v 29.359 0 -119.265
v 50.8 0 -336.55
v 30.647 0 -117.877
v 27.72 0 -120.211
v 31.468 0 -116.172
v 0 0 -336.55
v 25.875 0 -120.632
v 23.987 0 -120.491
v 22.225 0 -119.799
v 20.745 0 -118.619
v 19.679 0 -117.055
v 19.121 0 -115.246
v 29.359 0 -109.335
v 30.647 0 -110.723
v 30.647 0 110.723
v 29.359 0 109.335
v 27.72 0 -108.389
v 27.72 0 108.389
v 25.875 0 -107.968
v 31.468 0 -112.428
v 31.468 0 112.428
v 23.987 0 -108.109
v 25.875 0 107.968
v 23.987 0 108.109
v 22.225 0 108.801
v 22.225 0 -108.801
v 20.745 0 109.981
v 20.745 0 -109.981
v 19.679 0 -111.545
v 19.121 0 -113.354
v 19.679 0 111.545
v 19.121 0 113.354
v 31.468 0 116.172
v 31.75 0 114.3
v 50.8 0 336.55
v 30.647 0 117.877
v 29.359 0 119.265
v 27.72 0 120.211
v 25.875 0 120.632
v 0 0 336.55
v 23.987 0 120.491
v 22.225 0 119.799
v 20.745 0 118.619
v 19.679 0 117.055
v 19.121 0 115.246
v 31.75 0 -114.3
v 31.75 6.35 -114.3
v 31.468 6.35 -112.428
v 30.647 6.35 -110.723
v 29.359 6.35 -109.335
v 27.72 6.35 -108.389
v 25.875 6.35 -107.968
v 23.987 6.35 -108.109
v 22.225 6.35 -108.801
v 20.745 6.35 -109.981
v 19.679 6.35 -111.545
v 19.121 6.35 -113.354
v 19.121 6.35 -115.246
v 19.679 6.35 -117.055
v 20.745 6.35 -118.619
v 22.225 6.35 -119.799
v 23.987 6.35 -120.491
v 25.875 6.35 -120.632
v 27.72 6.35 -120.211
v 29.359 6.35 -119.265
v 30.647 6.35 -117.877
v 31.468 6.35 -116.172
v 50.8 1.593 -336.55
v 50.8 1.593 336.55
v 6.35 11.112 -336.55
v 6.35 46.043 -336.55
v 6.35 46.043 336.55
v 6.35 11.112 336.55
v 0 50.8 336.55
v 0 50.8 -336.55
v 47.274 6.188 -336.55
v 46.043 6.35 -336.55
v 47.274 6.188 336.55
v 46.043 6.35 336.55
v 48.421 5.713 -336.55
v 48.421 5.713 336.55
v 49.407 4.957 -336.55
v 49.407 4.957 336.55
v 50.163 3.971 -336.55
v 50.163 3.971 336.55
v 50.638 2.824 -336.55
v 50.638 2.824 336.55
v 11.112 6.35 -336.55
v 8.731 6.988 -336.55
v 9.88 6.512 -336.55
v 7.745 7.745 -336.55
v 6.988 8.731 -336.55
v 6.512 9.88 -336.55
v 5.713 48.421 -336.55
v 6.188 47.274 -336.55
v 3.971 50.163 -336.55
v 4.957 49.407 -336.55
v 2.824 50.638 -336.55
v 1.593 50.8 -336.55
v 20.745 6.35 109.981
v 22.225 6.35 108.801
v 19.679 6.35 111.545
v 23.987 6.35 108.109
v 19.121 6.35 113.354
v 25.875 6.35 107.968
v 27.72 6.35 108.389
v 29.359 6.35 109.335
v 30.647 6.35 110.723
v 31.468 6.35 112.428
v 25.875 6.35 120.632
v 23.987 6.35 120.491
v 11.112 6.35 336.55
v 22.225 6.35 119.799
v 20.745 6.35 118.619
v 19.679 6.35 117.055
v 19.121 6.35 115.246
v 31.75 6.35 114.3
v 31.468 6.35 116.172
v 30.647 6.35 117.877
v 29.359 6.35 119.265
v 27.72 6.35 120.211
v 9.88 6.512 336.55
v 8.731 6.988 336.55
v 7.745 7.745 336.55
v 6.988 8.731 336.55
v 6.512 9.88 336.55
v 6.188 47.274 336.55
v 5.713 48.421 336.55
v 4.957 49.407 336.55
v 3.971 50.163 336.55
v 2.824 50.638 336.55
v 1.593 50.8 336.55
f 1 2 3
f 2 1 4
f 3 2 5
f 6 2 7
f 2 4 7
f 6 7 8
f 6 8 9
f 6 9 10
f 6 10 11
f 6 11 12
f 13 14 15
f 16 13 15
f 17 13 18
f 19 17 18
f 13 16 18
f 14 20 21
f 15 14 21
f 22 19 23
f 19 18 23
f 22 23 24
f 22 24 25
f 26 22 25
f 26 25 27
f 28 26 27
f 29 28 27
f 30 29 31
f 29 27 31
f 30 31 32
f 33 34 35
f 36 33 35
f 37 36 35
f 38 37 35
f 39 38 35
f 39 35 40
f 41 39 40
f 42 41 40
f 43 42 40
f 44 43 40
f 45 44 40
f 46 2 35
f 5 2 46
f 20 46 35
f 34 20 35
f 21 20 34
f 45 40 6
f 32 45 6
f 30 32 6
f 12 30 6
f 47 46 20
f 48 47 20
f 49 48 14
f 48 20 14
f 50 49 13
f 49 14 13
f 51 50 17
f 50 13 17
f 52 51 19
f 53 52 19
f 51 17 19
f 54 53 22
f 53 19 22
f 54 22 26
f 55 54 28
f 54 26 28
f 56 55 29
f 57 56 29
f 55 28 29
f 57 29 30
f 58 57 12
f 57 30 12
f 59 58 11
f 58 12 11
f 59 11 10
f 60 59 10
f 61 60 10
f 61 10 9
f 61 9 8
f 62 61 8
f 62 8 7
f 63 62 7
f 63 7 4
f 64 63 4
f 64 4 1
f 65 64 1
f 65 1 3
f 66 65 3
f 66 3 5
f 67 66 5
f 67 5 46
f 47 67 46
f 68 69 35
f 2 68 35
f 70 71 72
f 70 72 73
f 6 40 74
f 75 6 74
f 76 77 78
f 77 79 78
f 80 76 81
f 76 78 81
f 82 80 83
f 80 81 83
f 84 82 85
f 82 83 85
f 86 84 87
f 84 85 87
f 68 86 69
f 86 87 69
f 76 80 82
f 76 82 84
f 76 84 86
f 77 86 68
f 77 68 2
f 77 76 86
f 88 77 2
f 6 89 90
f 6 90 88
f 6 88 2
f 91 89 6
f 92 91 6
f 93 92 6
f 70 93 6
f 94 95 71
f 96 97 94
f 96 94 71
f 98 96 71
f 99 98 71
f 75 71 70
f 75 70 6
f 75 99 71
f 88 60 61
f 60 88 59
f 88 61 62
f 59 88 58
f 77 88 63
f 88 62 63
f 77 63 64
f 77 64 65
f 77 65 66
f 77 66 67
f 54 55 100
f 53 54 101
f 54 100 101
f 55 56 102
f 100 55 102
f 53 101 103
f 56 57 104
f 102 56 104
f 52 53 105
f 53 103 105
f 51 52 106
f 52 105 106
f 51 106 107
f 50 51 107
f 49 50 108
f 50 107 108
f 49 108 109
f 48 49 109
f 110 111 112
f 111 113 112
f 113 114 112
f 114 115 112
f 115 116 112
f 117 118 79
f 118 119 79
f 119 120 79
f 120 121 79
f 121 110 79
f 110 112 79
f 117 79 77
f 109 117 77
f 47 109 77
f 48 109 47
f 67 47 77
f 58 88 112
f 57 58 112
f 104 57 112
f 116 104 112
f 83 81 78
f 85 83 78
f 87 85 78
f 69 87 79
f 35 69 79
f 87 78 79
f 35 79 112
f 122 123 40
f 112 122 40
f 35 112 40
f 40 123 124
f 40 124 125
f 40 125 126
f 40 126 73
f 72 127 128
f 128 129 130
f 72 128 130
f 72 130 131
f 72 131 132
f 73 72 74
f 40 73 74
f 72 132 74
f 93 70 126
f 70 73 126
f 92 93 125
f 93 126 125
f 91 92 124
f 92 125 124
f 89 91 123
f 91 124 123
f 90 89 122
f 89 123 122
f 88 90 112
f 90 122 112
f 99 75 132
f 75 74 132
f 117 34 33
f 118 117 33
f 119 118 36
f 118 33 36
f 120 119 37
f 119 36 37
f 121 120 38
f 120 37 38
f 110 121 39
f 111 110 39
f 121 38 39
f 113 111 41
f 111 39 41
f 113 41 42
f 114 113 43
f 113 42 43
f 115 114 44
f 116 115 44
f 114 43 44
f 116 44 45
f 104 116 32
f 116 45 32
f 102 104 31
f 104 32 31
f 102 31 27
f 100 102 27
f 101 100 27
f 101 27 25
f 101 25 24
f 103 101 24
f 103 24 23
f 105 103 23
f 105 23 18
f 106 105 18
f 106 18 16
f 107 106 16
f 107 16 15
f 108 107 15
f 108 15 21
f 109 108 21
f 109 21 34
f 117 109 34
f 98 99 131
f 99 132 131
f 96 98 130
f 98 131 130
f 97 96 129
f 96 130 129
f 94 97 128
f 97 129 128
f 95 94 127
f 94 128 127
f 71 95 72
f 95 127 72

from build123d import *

# Parameters (mm, degrees)
BOSS_EXTRUDE1_DEPTH = 336.55
SKETCH2_R           = 6.35
CUT_EXTRUDE1_DEPTH  = 51.8


with BuildPart() as part:
    # Sketch1 → Boss-Extrude1 (new body, symmetric)
    with BuildSketch(Plane.XY):
        with BuildLine():
            Line((0, 0), (0, 50.8))
            Line((0, 50.8), (1.59258, 50.8))
            ThreePointArc((1.59258, 50.8), (4.956583943, 49.406583943), (6.35, 46.04258))
            Line((6.35, 46.04258), (6.35, 11.1125))
            ThreePointArc((6.35, 11.1125), (7.744903955, 7.744903955), (11.1125, 6.35))
            Line((11.1125, 6.35), (46.04258, 6.35))
            ThreePointArc((46.04258, 6.35), (49.406583943, 4.956583943), (50.8, 1.59258))
            Line((50.8, 1.59258), (50.8, 0))
            Line((50.8, 0), (0, 0))
        make_face()
    extrude(amount=BOSS_EXTRUDE1_DEPTH, both=True)

    # Sketch2 → Cut-Extrude1 (cut, through all)
    with BuildSketch(Plane.XZ):
        with Locations((25.4, -114.3)):
            Circle(SKETCH2_R)
        with Locations((25.4, 114.3)):
            Circle(SKETCH2_R)
    extrude(amount=-CUT_EXTRUDE1_DEPTH, mode=Mode.SUBTRACT)


solid = part.part
